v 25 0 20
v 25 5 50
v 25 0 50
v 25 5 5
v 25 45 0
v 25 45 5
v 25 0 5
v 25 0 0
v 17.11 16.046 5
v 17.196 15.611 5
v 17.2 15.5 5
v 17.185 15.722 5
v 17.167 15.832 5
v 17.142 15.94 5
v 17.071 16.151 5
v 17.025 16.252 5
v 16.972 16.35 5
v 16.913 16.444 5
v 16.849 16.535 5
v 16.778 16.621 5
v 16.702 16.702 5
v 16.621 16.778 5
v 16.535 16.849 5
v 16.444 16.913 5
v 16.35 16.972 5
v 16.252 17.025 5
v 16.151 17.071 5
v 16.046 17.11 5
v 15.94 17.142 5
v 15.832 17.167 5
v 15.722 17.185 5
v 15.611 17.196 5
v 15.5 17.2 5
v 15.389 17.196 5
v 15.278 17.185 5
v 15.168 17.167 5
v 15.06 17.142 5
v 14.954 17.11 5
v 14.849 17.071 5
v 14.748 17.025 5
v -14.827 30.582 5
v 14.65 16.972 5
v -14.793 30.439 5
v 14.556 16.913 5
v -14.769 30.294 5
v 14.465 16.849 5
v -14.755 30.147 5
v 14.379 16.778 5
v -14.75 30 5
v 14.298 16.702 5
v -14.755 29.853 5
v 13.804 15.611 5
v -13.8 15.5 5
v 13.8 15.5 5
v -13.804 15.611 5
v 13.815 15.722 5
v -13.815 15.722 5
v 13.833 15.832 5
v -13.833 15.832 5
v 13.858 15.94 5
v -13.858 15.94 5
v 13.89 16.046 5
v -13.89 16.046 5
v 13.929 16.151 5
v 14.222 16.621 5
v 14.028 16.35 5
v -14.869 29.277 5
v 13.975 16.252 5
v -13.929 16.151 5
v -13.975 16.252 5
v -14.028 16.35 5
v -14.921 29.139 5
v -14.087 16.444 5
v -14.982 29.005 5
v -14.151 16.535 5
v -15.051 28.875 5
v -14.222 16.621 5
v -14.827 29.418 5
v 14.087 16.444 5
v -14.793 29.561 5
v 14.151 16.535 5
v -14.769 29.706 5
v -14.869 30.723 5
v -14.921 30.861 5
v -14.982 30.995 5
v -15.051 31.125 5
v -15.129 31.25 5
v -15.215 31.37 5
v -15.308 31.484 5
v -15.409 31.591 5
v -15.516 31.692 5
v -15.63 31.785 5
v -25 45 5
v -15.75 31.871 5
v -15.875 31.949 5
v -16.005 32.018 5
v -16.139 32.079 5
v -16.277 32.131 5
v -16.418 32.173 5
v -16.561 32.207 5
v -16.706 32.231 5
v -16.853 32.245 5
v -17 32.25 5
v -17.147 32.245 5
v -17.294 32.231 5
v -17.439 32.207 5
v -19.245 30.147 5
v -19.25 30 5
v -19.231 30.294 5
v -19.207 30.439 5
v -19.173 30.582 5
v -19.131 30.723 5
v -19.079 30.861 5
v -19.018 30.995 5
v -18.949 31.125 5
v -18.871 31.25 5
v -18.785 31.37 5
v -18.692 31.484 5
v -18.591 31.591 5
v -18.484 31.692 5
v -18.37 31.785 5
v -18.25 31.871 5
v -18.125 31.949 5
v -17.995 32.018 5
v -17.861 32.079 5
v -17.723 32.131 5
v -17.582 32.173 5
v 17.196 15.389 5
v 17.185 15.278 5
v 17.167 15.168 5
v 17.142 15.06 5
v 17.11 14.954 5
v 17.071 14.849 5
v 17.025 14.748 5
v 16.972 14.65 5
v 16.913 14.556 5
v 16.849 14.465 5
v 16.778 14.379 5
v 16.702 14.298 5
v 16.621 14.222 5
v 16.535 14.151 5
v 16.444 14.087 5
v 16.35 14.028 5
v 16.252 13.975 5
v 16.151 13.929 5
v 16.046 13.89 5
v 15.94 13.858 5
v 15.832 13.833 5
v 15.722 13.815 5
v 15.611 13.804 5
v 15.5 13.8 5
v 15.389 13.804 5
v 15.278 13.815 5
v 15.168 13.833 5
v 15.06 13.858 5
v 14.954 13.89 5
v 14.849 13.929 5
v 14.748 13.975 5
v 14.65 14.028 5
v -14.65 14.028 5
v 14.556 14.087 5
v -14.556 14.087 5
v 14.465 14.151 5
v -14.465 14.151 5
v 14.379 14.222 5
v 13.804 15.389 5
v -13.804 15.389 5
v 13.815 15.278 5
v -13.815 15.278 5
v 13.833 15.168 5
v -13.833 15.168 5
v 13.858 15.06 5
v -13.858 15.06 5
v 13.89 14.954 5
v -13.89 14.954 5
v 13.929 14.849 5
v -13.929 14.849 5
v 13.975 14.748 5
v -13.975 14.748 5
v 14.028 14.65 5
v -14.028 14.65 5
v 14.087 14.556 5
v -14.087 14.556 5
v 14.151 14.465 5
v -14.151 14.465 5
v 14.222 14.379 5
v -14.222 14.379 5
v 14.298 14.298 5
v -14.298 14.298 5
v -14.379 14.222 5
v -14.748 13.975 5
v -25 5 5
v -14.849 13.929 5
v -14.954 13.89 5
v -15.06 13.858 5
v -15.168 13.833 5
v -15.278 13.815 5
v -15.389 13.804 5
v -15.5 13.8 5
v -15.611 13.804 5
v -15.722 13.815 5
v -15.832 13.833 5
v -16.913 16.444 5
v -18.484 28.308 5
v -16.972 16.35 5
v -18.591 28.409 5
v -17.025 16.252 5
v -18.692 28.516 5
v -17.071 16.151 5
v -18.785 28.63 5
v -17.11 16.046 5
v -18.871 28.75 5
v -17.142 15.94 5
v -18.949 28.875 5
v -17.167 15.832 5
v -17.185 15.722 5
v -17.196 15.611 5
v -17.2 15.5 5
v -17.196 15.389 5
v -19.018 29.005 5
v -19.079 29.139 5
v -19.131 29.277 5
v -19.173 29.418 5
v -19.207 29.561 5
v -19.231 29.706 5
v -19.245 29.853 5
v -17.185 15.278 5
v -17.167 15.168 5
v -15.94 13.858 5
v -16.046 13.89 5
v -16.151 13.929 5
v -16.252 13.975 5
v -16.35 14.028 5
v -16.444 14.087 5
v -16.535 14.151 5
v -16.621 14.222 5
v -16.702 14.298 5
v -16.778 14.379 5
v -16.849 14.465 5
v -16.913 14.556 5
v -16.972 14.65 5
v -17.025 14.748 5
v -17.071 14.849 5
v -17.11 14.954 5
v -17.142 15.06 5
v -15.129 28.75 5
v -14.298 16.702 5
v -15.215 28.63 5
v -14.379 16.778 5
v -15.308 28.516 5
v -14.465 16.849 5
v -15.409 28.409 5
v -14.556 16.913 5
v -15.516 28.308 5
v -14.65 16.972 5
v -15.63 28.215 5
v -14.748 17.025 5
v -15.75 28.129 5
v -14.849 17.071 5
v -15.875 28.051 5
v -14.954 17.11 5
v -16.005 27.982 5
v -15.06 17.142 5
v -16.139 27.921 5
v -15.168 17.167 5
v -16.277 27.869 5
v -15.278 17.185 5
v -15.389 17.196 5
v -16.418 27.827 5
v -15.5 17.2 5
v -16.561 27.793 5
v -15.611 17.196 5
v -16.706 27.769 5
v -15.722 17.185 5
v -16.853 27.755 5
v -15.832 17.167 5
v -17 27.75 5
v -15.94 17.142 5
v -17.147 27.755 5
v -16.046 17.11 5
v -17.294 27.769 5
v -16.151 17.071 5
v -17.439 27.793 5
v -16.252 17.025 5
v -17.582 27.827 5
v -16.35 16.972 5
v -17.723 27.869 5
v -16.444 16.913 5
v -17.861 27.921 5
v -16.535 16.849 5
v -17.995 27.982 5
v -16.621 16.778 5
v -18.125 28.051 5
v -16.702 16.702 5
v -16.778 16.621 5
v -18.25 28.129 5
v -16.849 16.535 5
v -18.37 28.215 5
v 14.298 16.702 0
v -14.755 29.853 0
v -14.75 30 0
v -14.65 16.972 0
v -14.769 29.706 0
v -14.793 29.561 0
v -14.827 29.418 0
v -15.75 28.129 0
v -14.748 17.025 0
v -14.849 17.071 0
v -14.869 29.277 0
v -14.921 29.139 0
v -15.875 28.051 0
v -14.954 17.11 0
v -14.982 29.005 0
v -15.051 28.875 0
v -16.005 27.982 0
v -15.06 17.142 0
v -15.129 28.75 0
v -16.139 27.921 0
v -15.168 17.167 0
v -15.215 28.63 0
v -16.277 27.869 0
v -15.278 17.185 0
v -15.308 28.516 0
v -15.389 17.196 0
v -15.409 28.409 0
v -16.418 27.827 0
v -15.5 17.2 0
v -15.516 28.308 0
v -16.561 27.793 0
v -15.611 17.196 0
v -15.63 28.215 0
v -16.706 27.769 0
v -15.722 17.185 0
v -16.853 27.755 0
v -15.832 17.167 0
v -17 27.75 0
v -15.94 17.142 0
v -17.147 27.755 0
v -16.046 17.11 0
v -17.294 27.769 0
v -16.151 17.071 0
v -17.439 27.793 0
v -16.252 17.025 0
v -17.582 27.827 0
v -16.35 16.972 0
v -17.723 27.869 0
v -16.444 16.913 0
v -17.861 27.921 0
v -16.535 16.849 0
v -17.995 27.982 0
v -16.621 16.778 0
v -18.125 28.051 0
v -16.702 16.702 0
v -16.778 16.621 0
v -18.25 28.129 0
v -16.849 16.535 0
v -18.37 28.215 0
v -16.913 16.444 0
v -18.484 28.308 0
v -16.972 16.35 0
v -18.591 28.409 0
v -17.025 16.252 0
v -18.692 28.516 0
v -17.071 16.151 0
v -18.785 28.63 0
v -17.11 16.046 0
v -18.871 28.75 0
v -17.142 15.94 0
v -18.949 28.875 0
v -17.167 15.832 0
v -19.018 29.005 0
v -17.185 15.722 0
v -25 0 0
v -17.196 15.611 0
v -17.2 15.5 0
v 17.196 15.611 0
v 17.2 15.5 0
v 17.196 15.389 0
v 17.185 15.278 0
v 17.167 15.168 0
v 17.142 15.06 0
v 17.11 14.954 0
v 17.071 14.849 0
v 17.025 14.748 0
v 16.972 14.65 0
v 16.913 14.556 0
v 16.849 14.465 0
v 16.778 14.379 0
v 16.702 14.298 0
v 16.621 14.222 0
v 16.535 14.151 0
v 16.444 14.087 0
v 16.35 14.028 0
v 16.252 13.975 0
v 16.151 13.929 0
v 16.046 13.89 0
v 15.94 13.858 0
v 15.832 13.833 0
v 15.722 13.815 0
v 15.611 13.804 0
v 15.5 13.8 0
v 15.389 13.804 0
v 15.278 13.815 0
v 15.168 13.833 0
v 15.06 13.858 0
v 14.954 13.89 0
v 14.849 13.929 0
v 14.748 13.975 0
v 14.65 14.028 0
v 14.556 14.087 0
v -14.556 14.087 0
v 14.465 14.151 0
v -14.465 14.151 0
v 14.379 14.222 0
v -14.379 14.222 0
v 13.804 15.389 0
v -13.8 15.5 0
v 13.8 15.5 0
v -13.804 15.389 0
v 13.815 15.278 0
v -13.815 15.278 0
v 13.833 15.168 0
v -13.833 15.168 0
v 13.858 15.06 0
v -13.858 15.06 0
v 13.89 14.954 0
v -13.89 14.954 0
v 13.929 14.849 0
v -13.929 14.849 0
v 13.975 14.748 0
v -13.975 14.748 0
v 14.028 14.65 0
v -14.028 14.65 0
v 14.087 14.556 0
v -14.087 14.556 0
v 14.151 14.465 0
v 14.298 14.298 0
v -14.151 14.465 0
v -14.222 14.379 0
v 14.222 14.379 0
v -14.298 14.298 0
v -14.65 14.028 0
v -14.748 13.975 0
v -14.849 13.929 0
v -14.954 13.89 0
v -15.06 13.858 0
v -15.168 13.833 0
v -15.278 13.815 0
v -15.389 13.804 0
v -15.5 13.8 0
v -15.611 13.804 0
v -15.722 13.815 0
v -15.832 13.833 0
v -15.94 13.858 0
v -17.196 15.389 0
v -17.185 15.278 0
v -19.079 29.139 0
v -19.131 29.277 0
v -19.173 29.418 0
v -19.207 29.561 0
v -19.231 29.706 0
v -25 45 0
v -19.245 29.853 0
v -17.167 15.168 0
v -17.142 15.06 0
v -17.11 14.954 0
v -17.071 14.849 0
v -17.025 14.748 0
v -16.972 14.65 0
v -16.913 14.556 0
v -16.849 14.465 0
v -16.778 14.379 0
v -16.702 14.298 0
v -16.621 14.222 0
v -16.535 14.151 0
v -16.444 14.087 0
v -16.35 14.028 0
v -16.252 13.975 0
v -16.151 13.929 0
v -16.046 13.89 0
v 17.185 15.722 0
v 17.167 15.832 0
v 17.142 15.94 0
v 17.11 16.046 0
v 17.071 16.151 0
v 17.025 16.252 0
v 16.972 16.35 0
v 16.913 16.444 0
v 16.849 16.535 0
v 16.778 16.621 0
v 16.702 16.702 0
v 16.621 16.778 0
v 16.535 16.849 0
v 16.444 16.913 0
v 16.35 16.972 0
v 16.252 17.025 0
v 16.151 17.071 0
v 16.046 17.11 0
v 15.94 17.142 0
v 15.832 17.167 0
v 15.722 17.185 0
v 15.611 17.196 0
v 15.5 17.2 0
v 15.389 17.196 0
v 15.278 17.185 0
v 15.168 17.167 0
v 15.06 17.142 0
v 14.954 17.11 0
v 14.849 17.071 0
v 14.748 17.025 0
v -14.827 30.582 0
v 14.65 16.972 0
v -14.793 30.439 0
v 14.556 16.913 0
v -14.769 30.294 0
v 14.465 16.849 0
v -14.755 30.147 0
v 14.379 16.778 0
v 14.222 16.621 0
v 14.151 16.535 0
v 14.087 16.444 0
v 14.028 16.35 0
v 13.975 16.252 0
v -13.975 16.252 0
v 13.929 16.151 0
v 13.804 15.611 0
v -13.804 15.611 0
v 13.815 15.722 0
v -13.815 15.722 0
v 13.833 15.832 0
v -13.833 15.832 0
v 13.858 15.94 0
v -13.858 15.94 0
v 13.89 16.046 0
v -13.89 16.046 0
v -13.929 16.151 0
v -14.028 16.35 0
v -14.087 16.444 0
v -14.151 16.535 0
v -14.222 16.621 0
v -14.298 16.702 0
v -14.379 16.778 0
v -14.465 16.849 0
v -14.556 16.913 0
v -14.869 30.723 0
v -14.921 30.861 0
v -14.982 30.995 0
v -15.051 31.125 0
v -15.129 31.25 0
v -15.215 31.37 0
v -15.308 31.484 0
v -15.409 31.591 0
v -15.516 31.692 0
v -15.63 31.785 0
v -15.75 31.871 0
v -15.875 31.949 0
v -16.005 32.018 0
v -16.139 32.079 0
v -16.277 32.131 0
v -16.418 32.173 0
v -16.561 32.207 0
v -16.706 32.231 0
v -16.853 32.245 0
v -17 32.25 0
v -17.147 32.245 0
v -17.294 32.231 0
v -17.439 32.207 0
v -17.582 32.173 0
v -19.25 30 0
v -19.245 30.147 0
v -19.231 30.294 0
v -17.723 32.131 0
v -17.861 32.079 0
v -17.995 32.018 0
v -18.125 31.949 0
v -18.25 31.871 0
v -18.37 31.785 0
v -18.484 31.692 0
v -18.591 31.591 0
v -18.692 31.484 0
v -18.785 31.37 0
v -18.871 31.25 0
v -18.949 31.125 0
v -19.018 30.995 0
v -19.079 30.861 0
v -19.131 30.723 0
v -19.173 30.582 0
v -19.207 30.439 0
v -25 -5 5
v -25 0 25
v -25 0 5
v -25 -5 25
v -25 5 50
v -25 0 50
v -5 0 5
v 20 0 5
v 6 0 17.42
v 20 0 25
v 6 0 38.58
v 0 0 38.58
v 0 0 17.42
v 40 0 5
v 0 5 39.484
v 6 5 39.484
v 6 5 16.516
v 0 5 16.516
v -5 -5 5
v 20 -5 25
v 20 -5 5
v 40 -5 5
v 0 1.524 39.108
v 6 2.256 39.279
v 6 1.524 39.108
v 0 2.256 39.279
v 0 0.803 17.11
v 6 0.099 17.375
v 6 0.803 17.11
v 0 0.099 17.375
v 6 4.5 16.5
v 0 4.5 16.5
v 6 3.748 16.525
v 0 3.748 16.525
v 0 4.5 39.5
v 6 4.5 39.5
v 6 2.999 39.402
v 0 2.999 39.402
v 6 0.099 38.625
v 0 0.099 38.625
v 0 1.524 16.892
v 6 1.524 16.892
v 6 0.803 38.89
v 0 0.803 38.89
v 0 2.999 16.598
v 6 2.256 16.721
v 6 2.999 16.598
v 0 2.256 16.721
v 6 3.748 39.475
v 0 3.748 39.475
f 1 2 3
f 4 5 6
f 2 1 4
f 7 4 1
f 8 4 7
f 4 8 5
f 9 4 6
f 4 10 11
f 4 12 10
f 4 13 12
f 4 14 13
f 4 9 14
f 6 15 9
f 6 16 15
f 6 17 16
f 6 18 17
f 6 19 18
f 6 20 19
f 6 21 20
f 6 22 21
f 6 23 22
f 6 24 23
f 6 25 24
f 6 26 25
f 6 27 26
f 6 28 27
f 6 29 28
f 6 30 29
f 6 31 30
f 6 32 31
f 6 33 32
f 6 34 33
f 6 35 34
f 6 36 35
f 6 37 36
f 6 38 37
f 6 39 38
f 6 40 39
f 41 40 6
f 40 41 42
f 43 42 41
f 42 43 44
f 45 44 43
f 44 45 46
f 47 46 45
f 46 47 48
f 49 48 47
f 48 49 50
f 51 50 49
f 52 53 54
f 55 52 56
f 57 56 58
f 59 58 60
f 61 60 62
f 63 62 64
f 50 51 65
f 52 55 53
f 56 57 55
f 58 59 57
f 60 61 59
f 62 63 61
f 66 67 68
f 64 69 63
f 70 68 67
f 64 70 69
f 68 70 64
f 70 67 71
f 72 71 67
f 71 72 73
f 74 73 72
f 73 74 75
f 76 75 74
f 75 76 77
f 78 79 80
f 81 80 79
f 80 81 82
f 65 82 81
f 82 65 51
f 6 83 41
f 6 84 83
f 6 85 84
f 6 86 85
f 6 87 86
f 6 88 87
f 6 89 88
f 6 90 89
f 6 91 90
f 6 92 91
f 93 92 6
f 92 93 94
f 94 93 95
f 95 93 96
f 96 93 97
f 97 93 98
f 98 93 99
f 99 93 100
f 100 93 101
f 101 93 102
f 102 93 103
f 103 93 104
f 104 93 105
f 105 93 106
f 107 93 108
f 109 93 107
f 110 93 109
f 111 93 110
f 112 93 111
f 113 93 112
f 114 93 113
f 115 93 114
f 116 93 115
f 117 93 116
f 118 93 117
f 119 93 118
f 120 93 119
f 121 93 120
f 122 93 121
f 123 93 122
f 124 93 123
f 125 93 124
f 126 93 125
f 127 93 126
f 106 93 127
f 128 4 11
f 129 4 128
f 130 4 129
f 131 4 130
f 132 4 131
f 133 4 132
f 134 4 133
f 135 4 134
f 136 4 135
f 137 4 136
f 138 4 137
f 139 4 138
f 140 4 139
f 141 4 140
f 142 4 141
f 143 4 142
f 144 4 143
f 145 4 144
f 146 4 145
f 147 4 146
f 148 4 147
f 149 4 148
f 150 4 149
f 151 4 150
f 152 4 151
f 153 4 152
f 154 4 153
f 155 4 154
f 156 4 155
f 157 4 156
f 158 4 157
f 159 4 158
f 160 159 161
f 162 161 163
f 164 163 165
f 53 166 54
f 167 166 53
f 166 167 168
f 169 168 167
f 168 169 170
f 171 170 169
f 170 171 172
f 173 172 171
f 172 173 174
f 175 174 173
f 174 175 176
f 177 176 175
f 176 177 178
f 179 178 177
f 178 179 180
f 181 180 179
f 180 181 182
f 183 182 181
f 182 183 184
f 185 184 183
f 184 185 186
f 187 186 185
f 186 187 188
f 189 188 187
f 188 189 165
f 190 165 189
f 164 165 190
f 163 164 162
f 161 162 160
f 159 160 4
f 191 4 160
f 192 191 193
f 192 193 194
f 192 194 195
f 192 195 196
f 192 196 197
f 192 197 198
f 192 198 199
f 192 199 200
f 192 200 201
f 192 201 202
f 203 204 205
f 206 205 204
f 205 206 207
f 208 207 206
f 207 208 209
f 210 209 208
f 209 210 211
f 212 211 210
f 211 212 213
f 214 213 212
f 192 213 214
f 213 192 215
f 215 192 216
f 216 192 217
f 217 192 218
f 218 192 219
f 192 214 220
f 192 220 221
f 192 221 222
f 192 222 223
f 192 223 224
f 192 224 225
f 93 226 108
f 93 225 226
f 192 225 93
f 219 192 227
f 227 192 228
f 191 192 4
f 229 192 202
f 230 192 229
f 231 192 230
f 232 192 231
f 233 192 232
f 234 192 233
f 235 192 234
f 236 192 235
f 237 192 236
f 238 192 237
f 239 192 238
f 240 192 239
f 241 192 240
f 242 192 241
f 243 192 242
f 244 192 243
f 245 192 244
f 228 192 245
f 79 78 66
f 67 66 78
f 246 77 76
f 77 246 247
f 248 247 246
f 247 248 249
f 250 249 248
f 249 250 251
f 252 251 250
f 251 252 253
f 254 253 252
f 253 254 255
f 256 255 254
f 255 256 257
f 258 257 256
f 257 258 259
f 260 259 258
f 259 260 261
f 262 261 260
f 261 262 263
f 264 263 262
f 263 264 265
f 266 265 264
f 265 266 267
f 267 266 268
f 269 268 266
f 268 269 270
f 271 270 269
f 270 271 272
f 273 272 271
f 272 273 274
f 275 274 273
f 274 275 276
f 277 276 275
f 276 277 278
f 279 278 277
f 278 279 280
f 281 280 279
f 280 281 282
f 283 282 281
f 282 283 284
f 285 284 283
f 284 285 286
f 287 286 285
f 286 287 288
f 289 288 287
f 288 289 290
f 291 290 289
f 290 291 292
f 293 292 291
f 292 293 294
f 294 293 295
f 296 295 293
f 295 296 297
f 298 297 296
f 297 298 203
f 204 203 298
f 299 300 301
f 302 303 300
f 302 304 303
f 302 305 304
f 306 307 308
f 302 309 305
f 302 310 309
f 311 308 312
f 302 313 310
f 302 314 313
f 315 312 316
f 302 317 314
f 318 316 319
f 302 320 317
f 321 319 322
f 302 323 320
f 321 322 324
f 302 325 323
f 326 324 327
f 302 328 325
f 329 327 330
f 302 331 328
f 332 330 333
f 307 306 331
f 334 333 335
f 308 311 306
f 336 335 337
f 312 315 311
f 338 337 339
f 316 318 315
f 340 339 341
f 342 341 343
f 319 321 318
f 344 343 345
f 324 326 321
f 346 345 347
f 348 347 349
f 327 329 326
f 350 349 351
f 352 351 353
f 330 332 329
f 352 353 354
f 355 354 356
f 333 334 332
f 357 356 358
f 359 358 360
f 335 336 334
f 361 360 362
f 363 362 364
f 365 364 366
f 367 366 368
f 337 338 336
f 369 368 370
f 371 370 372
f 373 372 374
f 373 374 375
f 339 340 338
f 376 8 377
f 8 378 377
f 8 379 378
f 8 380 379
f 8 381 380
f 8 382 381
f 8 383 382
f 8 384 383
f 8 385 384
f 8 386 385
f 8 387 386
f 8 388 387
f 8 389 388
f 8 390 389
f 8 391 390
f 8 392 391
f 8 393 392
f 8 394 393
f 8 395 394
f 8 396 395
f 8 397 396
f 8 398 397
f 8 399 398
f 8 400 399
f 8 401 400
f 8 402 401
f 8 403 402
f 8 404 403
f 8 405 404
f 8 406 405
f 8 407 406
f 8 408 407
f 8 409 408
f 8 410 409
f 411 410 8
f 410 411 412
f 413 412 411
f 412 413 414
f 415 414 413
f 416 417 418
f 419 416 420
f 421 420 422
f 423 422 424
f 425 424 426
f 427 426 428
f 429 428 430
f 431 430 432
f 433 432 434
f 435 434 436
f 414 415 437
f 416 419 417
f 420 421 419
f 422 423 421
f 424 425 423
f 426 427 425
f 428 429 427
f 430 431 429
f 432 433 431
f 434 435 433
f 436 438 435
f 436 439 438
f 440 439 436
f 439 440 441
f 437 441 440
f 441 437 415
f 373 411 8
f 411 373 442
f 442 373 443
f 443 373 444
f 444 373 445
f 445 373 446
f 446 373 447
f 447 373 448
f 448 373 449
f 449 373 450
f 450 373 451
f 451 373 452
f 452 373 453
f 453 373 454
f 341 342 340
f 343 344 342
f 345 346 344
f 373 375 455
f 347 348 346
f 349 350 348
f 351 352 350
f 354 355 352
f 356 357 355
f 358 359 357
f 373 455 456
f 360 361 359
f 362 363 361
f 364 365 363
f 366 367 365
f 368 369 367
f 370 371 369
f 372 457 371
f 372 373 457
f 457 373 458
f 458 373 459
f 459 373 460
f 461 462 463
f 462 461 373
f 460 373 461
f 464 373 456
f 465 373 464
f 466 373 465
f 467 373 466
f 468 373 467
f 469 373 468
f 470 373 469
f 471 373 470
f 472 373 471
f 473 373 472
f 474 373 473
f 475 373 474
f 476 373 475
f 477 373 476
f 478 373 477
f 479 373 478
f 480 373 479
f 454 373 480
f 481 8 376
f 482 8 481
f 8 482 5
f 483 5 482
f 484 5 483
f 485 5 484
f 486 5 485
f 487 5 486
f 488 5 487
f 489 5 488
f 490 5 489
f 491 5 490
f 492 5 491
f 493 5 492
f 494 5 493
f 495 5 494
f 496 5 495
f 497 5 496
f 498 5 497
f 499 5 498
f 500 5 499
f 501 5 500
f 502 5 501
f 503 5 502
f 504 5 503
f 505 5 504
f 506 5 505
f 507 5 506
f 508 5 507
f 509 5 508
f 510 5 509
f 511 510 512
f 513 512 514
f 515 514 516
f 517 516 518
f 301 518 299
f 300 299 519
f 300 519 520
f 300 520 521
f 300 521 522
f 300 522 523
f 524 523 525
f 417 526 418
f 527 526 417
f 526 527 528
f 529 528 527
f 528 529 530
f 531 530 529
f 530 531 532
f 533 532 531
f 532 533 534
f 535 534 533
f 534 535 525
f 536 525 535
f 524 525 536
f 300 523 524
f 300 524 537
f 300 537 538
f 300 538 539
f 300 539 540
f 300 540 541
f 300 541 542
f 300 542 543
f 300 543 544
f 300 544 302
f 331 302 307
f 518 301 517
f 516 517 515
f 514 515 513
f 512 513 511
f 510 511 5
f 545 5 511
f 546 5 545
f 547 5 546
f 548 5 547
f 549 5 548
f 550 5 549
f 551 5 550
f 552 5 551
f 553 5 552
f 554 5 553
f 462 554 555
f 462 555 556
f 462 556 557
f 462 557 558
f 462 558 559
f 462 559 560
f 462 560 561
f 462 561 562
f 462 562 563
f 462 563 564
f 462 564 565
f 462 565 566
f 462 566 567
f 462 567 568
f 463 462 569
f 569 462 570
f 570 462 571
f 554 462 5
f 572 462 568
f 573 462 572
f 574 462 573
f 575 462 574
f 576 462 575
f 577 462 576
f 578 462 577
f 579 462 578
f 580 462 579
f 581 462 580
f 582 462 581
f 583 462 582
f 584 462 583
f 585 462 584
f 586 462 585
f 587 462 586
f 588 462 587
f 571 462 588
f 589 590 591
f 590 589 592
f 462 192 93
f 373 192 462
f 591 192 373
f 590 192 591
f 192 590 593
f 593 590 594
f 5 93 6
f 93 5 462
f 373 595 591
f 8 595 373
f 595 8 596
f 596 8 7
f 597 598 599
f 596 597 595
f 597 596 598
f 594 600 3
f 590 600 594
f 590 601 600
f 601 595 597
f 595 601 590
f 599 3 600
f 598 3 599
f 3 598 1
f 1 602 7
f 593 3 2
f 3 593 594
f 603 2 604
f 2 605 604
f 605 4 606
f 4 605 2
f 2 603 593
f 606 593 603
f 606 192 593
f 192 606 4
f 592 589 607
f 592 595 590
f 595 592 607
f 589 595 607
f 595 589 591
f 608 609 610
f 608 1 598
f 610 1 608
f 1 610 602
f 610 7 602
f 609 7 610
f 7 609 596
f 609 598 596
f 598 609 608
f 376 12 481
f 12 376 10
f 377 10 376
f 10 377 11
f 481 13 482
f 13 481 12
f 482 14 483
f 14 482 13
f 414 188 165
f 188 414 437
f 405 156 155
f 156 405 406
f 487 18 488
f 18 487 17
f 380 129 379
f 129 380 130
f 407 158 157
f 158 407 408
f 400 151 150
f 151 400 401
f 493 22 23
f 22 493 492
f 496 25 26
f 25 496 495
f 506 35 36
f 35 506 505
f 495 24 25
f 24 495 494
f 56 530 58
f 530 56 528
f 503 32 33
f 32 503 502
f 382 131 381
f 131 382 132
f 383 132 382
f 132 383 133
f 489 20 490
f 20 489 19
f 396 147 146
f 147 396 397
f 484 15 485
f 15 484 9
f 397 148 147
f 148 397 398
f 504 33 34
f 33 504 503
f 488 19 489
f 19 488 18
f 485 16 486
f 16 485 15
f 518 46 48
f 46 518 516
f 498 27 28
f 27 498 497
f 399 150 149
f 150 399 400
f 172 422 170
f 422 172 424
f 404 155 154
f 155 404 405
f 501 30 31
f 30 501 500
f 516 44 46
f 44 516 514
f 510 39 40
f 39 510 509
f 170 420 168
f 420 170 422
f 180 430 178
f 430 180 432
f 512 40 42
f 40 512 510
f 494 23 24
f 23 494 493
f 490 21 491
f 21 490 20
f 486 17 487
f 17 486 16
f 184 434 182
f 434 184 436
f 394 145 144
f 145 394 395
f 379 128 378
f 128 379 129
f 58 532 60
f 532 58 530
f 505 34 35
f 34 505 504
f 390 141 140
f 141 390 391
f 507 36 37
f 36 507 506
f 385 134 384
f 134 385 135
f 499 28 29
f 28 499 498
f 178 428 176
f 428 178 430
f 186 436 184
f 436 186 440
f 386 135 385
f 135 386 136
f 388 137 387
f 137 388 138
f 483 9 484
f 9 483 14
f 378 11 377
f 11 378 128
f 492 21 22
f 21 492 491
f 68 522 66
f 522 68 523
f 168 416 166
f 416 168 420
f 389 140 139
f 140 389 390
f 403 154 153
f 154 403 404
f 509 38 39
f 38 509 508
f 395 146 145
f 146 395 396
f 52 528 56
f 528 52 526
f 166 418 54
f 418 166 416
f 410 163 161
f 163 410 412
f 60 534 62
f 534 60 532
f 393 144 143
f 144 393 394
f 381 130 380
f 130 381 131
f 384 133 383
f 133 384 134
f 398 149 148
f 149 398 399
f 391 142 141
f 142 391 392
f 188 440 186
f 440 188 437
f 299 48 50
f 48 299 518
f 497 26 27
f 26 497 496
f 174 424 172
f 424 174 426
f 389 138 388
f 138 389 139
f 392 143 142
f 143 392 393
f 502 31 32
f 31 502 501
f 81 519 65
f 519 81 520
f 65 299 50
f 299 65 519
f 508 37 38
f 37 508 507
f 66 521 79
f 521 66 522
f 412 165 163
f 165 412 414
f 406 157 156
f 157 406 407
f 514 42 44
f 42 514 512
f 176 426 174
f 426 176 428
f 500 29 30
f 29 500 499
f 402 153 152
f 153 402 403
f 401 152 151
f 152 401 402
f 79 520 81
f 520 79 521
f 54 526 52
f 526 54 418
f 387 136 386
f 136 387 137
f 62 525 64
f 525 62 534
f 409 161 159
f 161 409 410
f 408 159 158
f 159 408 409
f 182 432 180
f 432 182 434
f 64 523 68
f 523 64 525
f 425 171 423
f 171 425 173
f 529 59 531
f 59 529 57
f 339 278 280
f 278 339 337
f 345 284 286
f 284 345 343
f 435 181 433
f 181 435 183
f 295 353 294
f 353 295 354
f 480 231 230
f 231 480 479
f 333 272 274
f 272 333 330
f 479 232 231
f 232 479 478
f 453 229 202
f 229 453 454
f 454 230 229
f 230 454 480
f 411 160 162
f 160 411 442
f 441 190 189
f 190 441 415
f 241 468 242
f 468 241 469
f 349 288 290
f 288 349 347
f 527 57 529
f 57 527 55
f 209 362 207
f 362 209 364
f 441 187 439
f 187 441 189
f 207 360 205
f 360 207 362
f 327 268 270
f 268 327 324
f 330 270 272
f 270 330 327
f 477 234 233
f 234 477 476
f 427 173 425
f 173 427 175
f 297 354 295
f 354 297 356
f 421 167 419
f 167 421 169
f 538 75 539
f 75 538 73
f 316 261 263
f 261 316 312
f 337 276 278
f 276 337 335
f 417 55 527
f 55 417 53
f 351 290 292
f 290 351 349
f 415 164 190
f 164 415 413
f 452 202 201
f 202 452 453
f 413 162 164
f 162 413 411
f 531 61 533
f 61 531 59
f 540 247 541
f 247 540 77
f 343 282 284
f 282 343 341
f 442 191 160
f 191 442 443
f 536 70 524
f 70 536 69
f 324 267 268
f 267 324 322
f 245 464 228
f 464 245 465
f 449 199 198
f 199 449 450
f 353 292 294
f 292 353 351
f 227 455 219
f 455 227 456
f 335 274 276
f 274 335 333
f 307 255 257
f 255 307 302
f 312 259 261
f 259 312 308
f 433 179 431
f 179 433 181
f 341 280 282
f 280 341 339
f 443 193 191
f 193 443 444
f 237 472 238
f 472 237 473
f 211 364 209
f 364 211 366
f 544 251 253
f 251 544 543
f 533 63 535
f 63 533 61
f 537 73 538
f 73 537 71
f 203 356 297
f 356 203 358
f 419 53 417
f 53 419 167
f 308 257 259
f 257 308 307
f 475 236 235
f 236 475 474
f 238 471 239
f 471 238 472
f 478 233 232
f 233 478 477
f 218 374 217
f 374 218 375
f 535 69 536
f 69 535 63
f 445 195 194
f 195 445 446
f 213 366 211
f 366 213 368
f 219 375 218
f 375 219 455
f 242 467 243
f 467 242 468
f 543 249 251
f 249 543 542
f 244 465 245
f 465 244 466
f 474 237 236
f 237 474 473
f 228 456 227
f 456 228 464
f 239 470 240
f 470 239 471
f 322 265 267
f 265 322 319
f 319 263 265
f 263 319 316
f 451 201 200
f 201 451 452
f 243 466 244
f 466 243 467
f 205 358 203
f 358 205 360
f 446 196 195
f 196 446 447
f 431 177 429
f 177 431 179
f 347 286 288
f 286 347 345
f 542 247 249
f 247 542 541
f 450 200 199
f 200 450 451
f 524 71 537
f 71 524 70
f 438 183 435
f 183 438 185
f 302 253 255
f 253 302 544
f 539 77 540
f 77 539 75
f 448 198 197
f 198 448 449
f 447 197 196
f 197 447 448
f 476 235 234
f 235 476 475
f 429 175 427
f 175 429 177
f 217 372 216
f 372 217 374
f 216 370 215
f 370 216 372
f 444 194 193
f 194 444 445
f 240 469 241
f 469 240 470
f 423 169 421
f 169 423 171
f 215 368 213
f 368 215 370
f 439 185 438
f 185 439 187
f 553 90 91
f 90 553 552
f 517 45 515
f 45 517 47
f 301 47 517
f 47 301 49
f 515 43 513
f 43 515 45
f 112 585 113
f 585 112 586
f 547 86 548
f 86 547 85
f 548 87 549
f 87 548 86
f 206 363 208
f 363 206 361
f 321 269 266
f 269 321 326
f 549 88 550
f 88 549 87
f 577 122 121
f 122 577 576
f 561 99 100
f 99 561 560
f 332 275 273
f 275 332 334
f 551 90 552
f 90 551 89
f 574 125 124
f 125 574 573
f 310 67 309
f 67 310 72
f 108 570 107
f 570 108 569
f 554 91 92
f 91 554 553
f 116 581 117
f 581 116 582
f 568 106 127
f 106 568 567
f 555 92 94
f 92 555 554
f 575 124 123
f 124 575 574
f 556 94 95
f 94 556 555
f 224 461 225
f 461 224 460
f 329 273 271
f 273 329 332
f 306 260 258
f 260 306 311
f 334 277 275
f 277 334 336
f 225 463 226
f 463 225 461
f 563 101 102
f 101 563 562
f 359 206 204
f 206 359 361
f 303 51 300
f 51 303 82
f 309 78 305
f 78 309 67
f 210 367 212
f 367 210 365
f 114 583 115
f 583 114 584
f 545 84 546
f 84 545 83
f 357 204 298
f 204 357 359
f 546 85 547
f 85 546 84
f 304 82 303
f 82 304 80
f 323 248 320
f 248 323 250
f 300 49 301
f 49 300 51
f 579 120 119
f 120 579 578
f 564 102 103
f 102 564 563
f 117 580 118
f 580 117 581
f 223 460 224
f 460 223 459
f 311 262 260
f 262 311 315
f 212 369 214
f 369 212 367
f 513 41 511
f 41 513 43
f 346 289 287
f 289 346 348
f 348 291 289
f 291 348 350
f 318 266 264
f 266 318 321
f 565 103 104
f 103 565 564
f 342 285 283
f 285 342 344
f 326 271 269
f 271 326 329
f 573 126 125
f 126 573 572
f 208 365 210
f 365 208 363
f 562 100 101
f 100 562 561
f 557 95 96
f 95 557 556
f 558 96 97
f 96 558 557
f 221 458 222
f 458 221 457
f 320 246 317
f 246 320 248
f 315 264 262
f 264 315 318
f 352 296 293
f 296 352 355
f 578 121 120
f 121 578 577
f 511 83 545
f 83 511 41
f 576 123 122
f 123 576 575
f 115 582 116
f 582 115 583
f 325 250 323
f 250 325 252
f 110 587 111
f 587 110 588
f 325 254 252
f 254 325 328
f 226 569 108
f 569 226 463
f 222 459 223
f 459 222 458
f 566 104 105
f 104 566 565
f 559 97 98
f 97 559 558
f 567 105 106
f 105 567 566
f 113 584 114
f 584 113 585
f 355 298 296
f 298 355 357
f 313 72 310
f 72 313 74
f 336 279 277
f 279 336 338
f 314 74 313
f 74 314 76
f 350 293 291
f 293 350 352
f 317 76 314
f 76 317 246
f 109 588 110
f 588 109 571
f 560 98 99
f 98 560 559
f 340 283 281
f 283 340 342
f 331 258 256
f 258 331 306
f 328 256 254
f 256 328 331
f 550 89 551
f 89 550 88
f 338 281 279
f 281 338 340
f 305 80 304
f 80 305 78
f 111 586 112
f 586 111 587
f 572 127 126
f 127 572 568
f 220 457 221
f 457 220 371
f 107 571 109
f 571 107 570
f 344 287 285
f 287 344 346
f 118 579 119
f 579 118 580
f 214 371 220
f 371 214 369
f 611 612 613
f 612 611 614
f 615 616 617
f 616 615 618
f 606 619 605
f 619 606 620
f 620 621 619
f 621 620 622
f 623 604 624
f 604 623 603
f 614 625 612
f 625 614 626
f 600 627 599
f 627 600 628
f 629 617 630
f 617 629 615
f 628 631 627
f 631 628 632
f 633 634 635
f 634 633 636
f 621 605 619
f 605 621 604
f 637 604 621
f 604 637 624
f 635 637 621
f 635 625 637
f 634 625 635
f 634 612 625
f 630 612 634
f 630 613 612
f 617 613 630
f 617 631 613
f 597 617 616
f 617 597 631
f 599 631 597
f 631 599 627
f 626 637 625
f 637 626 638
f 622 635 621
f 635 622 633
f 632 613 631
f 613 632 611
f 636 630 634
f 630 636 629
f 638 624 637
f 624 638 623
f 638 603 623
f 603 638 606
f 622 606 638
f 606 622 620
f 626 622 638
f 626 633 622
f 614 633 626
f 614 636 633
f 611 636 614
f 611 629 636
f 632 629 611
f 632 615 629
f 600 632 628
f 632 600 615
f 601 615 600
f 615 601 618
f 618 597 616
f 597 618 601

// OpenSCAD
// L-shaped mounting bracket for NEMA 17 stepper motor
// Print orientation: base plate on the bed (z = 0), motor plate builds upward (+Z)

// ---------------- Parameters ----------------
plate_t      = 5;      // plate thickness (X direction)
base_h       = 45;     // base plate height (Y direction)
motor_h      = 50;     // motor plate height (Z direction)

hole_m4_x    = -17;    // M4 through-hole x position (left)
hole_m4_y    = 30;     // M4 through-hole y position
hole_m4_d    = 4.5;    // M4 hole diameter

hole_boss_d  = 23;     // motor centring boss hole diameter
hole_boss_z  = 28;     // boss hole centre height (Z)

screw_d      = 3.4;    // M3 screw hole diameter
screw_pitch  = 31;     // square pattern side length

gusset_t     = 5;      // gusset thickness (X direction)
gusset_y     = 20;     // gusset leg length along +Y
gusset_z     = 20;     // gusset leg length along +Z

eps          = 0.5;    // cutter overshoot past faces

$fn = 96;

// ---------------- Model ----------------
difference() {
    union() {
        // Base plate: x -25..25, y 0..45, z 0..5
        translate([-25, 0, 0])
            cube([50, base_h, plate_t]);

        // Motor plate: x -25..25, y 0..5, z 0..50
        translate([-25, 0, 0])
            cube([50, plate_t, motor_h]);

        // Left gusset: x -25..-20, y 0..20, z 5..25 (right angle at y=5, z=5)
        translate([-25, 0, 5])
            rotate([90, 0, 0])
                linear_extrude(height = gusset_t)
                    polygon(points = [
                        [0, 0],
                        [gusset_y, 0],
                        [0, gusset_z]
                    ]);

        // Right gusset: x 20..25, y 0..20, z 5..25 (right angle at y=5, z=5)
        translate([20, 0, 5])
            rotate([90, 0, 0])
                linear_extrude(height = gusset_t)
                    polygon(points = [
                        [0, 0],
                        [gusset_y, 0],
                        [0, gusset_z]
                    ]);
    }

    // M4 vertical through-holes
    translate([hole_m4_x, hole_m4_y, -eps])
        cylinder(d = hole_m4_d, h = plate_t + motor_h + 2 * eps);

    // Motor boss hole (along Y)
    translate([0, plate_t - eps, hole_boss_z])
        rotate([0, 90, 0])
            cylinder(d = hole_boss_d, h = plate_t + 2 * eps);

    // M3 screw holes on 31 mm square pattern, centred on boss hole
    for (a = [0, 90, 180, 270])
        rotate([0, 0, a])
            translate([screw_pitch / 2, screw_pitch / 2, -eps])
                cylinder(d = screw_d, h = motor_h + 2 * eps);
}
